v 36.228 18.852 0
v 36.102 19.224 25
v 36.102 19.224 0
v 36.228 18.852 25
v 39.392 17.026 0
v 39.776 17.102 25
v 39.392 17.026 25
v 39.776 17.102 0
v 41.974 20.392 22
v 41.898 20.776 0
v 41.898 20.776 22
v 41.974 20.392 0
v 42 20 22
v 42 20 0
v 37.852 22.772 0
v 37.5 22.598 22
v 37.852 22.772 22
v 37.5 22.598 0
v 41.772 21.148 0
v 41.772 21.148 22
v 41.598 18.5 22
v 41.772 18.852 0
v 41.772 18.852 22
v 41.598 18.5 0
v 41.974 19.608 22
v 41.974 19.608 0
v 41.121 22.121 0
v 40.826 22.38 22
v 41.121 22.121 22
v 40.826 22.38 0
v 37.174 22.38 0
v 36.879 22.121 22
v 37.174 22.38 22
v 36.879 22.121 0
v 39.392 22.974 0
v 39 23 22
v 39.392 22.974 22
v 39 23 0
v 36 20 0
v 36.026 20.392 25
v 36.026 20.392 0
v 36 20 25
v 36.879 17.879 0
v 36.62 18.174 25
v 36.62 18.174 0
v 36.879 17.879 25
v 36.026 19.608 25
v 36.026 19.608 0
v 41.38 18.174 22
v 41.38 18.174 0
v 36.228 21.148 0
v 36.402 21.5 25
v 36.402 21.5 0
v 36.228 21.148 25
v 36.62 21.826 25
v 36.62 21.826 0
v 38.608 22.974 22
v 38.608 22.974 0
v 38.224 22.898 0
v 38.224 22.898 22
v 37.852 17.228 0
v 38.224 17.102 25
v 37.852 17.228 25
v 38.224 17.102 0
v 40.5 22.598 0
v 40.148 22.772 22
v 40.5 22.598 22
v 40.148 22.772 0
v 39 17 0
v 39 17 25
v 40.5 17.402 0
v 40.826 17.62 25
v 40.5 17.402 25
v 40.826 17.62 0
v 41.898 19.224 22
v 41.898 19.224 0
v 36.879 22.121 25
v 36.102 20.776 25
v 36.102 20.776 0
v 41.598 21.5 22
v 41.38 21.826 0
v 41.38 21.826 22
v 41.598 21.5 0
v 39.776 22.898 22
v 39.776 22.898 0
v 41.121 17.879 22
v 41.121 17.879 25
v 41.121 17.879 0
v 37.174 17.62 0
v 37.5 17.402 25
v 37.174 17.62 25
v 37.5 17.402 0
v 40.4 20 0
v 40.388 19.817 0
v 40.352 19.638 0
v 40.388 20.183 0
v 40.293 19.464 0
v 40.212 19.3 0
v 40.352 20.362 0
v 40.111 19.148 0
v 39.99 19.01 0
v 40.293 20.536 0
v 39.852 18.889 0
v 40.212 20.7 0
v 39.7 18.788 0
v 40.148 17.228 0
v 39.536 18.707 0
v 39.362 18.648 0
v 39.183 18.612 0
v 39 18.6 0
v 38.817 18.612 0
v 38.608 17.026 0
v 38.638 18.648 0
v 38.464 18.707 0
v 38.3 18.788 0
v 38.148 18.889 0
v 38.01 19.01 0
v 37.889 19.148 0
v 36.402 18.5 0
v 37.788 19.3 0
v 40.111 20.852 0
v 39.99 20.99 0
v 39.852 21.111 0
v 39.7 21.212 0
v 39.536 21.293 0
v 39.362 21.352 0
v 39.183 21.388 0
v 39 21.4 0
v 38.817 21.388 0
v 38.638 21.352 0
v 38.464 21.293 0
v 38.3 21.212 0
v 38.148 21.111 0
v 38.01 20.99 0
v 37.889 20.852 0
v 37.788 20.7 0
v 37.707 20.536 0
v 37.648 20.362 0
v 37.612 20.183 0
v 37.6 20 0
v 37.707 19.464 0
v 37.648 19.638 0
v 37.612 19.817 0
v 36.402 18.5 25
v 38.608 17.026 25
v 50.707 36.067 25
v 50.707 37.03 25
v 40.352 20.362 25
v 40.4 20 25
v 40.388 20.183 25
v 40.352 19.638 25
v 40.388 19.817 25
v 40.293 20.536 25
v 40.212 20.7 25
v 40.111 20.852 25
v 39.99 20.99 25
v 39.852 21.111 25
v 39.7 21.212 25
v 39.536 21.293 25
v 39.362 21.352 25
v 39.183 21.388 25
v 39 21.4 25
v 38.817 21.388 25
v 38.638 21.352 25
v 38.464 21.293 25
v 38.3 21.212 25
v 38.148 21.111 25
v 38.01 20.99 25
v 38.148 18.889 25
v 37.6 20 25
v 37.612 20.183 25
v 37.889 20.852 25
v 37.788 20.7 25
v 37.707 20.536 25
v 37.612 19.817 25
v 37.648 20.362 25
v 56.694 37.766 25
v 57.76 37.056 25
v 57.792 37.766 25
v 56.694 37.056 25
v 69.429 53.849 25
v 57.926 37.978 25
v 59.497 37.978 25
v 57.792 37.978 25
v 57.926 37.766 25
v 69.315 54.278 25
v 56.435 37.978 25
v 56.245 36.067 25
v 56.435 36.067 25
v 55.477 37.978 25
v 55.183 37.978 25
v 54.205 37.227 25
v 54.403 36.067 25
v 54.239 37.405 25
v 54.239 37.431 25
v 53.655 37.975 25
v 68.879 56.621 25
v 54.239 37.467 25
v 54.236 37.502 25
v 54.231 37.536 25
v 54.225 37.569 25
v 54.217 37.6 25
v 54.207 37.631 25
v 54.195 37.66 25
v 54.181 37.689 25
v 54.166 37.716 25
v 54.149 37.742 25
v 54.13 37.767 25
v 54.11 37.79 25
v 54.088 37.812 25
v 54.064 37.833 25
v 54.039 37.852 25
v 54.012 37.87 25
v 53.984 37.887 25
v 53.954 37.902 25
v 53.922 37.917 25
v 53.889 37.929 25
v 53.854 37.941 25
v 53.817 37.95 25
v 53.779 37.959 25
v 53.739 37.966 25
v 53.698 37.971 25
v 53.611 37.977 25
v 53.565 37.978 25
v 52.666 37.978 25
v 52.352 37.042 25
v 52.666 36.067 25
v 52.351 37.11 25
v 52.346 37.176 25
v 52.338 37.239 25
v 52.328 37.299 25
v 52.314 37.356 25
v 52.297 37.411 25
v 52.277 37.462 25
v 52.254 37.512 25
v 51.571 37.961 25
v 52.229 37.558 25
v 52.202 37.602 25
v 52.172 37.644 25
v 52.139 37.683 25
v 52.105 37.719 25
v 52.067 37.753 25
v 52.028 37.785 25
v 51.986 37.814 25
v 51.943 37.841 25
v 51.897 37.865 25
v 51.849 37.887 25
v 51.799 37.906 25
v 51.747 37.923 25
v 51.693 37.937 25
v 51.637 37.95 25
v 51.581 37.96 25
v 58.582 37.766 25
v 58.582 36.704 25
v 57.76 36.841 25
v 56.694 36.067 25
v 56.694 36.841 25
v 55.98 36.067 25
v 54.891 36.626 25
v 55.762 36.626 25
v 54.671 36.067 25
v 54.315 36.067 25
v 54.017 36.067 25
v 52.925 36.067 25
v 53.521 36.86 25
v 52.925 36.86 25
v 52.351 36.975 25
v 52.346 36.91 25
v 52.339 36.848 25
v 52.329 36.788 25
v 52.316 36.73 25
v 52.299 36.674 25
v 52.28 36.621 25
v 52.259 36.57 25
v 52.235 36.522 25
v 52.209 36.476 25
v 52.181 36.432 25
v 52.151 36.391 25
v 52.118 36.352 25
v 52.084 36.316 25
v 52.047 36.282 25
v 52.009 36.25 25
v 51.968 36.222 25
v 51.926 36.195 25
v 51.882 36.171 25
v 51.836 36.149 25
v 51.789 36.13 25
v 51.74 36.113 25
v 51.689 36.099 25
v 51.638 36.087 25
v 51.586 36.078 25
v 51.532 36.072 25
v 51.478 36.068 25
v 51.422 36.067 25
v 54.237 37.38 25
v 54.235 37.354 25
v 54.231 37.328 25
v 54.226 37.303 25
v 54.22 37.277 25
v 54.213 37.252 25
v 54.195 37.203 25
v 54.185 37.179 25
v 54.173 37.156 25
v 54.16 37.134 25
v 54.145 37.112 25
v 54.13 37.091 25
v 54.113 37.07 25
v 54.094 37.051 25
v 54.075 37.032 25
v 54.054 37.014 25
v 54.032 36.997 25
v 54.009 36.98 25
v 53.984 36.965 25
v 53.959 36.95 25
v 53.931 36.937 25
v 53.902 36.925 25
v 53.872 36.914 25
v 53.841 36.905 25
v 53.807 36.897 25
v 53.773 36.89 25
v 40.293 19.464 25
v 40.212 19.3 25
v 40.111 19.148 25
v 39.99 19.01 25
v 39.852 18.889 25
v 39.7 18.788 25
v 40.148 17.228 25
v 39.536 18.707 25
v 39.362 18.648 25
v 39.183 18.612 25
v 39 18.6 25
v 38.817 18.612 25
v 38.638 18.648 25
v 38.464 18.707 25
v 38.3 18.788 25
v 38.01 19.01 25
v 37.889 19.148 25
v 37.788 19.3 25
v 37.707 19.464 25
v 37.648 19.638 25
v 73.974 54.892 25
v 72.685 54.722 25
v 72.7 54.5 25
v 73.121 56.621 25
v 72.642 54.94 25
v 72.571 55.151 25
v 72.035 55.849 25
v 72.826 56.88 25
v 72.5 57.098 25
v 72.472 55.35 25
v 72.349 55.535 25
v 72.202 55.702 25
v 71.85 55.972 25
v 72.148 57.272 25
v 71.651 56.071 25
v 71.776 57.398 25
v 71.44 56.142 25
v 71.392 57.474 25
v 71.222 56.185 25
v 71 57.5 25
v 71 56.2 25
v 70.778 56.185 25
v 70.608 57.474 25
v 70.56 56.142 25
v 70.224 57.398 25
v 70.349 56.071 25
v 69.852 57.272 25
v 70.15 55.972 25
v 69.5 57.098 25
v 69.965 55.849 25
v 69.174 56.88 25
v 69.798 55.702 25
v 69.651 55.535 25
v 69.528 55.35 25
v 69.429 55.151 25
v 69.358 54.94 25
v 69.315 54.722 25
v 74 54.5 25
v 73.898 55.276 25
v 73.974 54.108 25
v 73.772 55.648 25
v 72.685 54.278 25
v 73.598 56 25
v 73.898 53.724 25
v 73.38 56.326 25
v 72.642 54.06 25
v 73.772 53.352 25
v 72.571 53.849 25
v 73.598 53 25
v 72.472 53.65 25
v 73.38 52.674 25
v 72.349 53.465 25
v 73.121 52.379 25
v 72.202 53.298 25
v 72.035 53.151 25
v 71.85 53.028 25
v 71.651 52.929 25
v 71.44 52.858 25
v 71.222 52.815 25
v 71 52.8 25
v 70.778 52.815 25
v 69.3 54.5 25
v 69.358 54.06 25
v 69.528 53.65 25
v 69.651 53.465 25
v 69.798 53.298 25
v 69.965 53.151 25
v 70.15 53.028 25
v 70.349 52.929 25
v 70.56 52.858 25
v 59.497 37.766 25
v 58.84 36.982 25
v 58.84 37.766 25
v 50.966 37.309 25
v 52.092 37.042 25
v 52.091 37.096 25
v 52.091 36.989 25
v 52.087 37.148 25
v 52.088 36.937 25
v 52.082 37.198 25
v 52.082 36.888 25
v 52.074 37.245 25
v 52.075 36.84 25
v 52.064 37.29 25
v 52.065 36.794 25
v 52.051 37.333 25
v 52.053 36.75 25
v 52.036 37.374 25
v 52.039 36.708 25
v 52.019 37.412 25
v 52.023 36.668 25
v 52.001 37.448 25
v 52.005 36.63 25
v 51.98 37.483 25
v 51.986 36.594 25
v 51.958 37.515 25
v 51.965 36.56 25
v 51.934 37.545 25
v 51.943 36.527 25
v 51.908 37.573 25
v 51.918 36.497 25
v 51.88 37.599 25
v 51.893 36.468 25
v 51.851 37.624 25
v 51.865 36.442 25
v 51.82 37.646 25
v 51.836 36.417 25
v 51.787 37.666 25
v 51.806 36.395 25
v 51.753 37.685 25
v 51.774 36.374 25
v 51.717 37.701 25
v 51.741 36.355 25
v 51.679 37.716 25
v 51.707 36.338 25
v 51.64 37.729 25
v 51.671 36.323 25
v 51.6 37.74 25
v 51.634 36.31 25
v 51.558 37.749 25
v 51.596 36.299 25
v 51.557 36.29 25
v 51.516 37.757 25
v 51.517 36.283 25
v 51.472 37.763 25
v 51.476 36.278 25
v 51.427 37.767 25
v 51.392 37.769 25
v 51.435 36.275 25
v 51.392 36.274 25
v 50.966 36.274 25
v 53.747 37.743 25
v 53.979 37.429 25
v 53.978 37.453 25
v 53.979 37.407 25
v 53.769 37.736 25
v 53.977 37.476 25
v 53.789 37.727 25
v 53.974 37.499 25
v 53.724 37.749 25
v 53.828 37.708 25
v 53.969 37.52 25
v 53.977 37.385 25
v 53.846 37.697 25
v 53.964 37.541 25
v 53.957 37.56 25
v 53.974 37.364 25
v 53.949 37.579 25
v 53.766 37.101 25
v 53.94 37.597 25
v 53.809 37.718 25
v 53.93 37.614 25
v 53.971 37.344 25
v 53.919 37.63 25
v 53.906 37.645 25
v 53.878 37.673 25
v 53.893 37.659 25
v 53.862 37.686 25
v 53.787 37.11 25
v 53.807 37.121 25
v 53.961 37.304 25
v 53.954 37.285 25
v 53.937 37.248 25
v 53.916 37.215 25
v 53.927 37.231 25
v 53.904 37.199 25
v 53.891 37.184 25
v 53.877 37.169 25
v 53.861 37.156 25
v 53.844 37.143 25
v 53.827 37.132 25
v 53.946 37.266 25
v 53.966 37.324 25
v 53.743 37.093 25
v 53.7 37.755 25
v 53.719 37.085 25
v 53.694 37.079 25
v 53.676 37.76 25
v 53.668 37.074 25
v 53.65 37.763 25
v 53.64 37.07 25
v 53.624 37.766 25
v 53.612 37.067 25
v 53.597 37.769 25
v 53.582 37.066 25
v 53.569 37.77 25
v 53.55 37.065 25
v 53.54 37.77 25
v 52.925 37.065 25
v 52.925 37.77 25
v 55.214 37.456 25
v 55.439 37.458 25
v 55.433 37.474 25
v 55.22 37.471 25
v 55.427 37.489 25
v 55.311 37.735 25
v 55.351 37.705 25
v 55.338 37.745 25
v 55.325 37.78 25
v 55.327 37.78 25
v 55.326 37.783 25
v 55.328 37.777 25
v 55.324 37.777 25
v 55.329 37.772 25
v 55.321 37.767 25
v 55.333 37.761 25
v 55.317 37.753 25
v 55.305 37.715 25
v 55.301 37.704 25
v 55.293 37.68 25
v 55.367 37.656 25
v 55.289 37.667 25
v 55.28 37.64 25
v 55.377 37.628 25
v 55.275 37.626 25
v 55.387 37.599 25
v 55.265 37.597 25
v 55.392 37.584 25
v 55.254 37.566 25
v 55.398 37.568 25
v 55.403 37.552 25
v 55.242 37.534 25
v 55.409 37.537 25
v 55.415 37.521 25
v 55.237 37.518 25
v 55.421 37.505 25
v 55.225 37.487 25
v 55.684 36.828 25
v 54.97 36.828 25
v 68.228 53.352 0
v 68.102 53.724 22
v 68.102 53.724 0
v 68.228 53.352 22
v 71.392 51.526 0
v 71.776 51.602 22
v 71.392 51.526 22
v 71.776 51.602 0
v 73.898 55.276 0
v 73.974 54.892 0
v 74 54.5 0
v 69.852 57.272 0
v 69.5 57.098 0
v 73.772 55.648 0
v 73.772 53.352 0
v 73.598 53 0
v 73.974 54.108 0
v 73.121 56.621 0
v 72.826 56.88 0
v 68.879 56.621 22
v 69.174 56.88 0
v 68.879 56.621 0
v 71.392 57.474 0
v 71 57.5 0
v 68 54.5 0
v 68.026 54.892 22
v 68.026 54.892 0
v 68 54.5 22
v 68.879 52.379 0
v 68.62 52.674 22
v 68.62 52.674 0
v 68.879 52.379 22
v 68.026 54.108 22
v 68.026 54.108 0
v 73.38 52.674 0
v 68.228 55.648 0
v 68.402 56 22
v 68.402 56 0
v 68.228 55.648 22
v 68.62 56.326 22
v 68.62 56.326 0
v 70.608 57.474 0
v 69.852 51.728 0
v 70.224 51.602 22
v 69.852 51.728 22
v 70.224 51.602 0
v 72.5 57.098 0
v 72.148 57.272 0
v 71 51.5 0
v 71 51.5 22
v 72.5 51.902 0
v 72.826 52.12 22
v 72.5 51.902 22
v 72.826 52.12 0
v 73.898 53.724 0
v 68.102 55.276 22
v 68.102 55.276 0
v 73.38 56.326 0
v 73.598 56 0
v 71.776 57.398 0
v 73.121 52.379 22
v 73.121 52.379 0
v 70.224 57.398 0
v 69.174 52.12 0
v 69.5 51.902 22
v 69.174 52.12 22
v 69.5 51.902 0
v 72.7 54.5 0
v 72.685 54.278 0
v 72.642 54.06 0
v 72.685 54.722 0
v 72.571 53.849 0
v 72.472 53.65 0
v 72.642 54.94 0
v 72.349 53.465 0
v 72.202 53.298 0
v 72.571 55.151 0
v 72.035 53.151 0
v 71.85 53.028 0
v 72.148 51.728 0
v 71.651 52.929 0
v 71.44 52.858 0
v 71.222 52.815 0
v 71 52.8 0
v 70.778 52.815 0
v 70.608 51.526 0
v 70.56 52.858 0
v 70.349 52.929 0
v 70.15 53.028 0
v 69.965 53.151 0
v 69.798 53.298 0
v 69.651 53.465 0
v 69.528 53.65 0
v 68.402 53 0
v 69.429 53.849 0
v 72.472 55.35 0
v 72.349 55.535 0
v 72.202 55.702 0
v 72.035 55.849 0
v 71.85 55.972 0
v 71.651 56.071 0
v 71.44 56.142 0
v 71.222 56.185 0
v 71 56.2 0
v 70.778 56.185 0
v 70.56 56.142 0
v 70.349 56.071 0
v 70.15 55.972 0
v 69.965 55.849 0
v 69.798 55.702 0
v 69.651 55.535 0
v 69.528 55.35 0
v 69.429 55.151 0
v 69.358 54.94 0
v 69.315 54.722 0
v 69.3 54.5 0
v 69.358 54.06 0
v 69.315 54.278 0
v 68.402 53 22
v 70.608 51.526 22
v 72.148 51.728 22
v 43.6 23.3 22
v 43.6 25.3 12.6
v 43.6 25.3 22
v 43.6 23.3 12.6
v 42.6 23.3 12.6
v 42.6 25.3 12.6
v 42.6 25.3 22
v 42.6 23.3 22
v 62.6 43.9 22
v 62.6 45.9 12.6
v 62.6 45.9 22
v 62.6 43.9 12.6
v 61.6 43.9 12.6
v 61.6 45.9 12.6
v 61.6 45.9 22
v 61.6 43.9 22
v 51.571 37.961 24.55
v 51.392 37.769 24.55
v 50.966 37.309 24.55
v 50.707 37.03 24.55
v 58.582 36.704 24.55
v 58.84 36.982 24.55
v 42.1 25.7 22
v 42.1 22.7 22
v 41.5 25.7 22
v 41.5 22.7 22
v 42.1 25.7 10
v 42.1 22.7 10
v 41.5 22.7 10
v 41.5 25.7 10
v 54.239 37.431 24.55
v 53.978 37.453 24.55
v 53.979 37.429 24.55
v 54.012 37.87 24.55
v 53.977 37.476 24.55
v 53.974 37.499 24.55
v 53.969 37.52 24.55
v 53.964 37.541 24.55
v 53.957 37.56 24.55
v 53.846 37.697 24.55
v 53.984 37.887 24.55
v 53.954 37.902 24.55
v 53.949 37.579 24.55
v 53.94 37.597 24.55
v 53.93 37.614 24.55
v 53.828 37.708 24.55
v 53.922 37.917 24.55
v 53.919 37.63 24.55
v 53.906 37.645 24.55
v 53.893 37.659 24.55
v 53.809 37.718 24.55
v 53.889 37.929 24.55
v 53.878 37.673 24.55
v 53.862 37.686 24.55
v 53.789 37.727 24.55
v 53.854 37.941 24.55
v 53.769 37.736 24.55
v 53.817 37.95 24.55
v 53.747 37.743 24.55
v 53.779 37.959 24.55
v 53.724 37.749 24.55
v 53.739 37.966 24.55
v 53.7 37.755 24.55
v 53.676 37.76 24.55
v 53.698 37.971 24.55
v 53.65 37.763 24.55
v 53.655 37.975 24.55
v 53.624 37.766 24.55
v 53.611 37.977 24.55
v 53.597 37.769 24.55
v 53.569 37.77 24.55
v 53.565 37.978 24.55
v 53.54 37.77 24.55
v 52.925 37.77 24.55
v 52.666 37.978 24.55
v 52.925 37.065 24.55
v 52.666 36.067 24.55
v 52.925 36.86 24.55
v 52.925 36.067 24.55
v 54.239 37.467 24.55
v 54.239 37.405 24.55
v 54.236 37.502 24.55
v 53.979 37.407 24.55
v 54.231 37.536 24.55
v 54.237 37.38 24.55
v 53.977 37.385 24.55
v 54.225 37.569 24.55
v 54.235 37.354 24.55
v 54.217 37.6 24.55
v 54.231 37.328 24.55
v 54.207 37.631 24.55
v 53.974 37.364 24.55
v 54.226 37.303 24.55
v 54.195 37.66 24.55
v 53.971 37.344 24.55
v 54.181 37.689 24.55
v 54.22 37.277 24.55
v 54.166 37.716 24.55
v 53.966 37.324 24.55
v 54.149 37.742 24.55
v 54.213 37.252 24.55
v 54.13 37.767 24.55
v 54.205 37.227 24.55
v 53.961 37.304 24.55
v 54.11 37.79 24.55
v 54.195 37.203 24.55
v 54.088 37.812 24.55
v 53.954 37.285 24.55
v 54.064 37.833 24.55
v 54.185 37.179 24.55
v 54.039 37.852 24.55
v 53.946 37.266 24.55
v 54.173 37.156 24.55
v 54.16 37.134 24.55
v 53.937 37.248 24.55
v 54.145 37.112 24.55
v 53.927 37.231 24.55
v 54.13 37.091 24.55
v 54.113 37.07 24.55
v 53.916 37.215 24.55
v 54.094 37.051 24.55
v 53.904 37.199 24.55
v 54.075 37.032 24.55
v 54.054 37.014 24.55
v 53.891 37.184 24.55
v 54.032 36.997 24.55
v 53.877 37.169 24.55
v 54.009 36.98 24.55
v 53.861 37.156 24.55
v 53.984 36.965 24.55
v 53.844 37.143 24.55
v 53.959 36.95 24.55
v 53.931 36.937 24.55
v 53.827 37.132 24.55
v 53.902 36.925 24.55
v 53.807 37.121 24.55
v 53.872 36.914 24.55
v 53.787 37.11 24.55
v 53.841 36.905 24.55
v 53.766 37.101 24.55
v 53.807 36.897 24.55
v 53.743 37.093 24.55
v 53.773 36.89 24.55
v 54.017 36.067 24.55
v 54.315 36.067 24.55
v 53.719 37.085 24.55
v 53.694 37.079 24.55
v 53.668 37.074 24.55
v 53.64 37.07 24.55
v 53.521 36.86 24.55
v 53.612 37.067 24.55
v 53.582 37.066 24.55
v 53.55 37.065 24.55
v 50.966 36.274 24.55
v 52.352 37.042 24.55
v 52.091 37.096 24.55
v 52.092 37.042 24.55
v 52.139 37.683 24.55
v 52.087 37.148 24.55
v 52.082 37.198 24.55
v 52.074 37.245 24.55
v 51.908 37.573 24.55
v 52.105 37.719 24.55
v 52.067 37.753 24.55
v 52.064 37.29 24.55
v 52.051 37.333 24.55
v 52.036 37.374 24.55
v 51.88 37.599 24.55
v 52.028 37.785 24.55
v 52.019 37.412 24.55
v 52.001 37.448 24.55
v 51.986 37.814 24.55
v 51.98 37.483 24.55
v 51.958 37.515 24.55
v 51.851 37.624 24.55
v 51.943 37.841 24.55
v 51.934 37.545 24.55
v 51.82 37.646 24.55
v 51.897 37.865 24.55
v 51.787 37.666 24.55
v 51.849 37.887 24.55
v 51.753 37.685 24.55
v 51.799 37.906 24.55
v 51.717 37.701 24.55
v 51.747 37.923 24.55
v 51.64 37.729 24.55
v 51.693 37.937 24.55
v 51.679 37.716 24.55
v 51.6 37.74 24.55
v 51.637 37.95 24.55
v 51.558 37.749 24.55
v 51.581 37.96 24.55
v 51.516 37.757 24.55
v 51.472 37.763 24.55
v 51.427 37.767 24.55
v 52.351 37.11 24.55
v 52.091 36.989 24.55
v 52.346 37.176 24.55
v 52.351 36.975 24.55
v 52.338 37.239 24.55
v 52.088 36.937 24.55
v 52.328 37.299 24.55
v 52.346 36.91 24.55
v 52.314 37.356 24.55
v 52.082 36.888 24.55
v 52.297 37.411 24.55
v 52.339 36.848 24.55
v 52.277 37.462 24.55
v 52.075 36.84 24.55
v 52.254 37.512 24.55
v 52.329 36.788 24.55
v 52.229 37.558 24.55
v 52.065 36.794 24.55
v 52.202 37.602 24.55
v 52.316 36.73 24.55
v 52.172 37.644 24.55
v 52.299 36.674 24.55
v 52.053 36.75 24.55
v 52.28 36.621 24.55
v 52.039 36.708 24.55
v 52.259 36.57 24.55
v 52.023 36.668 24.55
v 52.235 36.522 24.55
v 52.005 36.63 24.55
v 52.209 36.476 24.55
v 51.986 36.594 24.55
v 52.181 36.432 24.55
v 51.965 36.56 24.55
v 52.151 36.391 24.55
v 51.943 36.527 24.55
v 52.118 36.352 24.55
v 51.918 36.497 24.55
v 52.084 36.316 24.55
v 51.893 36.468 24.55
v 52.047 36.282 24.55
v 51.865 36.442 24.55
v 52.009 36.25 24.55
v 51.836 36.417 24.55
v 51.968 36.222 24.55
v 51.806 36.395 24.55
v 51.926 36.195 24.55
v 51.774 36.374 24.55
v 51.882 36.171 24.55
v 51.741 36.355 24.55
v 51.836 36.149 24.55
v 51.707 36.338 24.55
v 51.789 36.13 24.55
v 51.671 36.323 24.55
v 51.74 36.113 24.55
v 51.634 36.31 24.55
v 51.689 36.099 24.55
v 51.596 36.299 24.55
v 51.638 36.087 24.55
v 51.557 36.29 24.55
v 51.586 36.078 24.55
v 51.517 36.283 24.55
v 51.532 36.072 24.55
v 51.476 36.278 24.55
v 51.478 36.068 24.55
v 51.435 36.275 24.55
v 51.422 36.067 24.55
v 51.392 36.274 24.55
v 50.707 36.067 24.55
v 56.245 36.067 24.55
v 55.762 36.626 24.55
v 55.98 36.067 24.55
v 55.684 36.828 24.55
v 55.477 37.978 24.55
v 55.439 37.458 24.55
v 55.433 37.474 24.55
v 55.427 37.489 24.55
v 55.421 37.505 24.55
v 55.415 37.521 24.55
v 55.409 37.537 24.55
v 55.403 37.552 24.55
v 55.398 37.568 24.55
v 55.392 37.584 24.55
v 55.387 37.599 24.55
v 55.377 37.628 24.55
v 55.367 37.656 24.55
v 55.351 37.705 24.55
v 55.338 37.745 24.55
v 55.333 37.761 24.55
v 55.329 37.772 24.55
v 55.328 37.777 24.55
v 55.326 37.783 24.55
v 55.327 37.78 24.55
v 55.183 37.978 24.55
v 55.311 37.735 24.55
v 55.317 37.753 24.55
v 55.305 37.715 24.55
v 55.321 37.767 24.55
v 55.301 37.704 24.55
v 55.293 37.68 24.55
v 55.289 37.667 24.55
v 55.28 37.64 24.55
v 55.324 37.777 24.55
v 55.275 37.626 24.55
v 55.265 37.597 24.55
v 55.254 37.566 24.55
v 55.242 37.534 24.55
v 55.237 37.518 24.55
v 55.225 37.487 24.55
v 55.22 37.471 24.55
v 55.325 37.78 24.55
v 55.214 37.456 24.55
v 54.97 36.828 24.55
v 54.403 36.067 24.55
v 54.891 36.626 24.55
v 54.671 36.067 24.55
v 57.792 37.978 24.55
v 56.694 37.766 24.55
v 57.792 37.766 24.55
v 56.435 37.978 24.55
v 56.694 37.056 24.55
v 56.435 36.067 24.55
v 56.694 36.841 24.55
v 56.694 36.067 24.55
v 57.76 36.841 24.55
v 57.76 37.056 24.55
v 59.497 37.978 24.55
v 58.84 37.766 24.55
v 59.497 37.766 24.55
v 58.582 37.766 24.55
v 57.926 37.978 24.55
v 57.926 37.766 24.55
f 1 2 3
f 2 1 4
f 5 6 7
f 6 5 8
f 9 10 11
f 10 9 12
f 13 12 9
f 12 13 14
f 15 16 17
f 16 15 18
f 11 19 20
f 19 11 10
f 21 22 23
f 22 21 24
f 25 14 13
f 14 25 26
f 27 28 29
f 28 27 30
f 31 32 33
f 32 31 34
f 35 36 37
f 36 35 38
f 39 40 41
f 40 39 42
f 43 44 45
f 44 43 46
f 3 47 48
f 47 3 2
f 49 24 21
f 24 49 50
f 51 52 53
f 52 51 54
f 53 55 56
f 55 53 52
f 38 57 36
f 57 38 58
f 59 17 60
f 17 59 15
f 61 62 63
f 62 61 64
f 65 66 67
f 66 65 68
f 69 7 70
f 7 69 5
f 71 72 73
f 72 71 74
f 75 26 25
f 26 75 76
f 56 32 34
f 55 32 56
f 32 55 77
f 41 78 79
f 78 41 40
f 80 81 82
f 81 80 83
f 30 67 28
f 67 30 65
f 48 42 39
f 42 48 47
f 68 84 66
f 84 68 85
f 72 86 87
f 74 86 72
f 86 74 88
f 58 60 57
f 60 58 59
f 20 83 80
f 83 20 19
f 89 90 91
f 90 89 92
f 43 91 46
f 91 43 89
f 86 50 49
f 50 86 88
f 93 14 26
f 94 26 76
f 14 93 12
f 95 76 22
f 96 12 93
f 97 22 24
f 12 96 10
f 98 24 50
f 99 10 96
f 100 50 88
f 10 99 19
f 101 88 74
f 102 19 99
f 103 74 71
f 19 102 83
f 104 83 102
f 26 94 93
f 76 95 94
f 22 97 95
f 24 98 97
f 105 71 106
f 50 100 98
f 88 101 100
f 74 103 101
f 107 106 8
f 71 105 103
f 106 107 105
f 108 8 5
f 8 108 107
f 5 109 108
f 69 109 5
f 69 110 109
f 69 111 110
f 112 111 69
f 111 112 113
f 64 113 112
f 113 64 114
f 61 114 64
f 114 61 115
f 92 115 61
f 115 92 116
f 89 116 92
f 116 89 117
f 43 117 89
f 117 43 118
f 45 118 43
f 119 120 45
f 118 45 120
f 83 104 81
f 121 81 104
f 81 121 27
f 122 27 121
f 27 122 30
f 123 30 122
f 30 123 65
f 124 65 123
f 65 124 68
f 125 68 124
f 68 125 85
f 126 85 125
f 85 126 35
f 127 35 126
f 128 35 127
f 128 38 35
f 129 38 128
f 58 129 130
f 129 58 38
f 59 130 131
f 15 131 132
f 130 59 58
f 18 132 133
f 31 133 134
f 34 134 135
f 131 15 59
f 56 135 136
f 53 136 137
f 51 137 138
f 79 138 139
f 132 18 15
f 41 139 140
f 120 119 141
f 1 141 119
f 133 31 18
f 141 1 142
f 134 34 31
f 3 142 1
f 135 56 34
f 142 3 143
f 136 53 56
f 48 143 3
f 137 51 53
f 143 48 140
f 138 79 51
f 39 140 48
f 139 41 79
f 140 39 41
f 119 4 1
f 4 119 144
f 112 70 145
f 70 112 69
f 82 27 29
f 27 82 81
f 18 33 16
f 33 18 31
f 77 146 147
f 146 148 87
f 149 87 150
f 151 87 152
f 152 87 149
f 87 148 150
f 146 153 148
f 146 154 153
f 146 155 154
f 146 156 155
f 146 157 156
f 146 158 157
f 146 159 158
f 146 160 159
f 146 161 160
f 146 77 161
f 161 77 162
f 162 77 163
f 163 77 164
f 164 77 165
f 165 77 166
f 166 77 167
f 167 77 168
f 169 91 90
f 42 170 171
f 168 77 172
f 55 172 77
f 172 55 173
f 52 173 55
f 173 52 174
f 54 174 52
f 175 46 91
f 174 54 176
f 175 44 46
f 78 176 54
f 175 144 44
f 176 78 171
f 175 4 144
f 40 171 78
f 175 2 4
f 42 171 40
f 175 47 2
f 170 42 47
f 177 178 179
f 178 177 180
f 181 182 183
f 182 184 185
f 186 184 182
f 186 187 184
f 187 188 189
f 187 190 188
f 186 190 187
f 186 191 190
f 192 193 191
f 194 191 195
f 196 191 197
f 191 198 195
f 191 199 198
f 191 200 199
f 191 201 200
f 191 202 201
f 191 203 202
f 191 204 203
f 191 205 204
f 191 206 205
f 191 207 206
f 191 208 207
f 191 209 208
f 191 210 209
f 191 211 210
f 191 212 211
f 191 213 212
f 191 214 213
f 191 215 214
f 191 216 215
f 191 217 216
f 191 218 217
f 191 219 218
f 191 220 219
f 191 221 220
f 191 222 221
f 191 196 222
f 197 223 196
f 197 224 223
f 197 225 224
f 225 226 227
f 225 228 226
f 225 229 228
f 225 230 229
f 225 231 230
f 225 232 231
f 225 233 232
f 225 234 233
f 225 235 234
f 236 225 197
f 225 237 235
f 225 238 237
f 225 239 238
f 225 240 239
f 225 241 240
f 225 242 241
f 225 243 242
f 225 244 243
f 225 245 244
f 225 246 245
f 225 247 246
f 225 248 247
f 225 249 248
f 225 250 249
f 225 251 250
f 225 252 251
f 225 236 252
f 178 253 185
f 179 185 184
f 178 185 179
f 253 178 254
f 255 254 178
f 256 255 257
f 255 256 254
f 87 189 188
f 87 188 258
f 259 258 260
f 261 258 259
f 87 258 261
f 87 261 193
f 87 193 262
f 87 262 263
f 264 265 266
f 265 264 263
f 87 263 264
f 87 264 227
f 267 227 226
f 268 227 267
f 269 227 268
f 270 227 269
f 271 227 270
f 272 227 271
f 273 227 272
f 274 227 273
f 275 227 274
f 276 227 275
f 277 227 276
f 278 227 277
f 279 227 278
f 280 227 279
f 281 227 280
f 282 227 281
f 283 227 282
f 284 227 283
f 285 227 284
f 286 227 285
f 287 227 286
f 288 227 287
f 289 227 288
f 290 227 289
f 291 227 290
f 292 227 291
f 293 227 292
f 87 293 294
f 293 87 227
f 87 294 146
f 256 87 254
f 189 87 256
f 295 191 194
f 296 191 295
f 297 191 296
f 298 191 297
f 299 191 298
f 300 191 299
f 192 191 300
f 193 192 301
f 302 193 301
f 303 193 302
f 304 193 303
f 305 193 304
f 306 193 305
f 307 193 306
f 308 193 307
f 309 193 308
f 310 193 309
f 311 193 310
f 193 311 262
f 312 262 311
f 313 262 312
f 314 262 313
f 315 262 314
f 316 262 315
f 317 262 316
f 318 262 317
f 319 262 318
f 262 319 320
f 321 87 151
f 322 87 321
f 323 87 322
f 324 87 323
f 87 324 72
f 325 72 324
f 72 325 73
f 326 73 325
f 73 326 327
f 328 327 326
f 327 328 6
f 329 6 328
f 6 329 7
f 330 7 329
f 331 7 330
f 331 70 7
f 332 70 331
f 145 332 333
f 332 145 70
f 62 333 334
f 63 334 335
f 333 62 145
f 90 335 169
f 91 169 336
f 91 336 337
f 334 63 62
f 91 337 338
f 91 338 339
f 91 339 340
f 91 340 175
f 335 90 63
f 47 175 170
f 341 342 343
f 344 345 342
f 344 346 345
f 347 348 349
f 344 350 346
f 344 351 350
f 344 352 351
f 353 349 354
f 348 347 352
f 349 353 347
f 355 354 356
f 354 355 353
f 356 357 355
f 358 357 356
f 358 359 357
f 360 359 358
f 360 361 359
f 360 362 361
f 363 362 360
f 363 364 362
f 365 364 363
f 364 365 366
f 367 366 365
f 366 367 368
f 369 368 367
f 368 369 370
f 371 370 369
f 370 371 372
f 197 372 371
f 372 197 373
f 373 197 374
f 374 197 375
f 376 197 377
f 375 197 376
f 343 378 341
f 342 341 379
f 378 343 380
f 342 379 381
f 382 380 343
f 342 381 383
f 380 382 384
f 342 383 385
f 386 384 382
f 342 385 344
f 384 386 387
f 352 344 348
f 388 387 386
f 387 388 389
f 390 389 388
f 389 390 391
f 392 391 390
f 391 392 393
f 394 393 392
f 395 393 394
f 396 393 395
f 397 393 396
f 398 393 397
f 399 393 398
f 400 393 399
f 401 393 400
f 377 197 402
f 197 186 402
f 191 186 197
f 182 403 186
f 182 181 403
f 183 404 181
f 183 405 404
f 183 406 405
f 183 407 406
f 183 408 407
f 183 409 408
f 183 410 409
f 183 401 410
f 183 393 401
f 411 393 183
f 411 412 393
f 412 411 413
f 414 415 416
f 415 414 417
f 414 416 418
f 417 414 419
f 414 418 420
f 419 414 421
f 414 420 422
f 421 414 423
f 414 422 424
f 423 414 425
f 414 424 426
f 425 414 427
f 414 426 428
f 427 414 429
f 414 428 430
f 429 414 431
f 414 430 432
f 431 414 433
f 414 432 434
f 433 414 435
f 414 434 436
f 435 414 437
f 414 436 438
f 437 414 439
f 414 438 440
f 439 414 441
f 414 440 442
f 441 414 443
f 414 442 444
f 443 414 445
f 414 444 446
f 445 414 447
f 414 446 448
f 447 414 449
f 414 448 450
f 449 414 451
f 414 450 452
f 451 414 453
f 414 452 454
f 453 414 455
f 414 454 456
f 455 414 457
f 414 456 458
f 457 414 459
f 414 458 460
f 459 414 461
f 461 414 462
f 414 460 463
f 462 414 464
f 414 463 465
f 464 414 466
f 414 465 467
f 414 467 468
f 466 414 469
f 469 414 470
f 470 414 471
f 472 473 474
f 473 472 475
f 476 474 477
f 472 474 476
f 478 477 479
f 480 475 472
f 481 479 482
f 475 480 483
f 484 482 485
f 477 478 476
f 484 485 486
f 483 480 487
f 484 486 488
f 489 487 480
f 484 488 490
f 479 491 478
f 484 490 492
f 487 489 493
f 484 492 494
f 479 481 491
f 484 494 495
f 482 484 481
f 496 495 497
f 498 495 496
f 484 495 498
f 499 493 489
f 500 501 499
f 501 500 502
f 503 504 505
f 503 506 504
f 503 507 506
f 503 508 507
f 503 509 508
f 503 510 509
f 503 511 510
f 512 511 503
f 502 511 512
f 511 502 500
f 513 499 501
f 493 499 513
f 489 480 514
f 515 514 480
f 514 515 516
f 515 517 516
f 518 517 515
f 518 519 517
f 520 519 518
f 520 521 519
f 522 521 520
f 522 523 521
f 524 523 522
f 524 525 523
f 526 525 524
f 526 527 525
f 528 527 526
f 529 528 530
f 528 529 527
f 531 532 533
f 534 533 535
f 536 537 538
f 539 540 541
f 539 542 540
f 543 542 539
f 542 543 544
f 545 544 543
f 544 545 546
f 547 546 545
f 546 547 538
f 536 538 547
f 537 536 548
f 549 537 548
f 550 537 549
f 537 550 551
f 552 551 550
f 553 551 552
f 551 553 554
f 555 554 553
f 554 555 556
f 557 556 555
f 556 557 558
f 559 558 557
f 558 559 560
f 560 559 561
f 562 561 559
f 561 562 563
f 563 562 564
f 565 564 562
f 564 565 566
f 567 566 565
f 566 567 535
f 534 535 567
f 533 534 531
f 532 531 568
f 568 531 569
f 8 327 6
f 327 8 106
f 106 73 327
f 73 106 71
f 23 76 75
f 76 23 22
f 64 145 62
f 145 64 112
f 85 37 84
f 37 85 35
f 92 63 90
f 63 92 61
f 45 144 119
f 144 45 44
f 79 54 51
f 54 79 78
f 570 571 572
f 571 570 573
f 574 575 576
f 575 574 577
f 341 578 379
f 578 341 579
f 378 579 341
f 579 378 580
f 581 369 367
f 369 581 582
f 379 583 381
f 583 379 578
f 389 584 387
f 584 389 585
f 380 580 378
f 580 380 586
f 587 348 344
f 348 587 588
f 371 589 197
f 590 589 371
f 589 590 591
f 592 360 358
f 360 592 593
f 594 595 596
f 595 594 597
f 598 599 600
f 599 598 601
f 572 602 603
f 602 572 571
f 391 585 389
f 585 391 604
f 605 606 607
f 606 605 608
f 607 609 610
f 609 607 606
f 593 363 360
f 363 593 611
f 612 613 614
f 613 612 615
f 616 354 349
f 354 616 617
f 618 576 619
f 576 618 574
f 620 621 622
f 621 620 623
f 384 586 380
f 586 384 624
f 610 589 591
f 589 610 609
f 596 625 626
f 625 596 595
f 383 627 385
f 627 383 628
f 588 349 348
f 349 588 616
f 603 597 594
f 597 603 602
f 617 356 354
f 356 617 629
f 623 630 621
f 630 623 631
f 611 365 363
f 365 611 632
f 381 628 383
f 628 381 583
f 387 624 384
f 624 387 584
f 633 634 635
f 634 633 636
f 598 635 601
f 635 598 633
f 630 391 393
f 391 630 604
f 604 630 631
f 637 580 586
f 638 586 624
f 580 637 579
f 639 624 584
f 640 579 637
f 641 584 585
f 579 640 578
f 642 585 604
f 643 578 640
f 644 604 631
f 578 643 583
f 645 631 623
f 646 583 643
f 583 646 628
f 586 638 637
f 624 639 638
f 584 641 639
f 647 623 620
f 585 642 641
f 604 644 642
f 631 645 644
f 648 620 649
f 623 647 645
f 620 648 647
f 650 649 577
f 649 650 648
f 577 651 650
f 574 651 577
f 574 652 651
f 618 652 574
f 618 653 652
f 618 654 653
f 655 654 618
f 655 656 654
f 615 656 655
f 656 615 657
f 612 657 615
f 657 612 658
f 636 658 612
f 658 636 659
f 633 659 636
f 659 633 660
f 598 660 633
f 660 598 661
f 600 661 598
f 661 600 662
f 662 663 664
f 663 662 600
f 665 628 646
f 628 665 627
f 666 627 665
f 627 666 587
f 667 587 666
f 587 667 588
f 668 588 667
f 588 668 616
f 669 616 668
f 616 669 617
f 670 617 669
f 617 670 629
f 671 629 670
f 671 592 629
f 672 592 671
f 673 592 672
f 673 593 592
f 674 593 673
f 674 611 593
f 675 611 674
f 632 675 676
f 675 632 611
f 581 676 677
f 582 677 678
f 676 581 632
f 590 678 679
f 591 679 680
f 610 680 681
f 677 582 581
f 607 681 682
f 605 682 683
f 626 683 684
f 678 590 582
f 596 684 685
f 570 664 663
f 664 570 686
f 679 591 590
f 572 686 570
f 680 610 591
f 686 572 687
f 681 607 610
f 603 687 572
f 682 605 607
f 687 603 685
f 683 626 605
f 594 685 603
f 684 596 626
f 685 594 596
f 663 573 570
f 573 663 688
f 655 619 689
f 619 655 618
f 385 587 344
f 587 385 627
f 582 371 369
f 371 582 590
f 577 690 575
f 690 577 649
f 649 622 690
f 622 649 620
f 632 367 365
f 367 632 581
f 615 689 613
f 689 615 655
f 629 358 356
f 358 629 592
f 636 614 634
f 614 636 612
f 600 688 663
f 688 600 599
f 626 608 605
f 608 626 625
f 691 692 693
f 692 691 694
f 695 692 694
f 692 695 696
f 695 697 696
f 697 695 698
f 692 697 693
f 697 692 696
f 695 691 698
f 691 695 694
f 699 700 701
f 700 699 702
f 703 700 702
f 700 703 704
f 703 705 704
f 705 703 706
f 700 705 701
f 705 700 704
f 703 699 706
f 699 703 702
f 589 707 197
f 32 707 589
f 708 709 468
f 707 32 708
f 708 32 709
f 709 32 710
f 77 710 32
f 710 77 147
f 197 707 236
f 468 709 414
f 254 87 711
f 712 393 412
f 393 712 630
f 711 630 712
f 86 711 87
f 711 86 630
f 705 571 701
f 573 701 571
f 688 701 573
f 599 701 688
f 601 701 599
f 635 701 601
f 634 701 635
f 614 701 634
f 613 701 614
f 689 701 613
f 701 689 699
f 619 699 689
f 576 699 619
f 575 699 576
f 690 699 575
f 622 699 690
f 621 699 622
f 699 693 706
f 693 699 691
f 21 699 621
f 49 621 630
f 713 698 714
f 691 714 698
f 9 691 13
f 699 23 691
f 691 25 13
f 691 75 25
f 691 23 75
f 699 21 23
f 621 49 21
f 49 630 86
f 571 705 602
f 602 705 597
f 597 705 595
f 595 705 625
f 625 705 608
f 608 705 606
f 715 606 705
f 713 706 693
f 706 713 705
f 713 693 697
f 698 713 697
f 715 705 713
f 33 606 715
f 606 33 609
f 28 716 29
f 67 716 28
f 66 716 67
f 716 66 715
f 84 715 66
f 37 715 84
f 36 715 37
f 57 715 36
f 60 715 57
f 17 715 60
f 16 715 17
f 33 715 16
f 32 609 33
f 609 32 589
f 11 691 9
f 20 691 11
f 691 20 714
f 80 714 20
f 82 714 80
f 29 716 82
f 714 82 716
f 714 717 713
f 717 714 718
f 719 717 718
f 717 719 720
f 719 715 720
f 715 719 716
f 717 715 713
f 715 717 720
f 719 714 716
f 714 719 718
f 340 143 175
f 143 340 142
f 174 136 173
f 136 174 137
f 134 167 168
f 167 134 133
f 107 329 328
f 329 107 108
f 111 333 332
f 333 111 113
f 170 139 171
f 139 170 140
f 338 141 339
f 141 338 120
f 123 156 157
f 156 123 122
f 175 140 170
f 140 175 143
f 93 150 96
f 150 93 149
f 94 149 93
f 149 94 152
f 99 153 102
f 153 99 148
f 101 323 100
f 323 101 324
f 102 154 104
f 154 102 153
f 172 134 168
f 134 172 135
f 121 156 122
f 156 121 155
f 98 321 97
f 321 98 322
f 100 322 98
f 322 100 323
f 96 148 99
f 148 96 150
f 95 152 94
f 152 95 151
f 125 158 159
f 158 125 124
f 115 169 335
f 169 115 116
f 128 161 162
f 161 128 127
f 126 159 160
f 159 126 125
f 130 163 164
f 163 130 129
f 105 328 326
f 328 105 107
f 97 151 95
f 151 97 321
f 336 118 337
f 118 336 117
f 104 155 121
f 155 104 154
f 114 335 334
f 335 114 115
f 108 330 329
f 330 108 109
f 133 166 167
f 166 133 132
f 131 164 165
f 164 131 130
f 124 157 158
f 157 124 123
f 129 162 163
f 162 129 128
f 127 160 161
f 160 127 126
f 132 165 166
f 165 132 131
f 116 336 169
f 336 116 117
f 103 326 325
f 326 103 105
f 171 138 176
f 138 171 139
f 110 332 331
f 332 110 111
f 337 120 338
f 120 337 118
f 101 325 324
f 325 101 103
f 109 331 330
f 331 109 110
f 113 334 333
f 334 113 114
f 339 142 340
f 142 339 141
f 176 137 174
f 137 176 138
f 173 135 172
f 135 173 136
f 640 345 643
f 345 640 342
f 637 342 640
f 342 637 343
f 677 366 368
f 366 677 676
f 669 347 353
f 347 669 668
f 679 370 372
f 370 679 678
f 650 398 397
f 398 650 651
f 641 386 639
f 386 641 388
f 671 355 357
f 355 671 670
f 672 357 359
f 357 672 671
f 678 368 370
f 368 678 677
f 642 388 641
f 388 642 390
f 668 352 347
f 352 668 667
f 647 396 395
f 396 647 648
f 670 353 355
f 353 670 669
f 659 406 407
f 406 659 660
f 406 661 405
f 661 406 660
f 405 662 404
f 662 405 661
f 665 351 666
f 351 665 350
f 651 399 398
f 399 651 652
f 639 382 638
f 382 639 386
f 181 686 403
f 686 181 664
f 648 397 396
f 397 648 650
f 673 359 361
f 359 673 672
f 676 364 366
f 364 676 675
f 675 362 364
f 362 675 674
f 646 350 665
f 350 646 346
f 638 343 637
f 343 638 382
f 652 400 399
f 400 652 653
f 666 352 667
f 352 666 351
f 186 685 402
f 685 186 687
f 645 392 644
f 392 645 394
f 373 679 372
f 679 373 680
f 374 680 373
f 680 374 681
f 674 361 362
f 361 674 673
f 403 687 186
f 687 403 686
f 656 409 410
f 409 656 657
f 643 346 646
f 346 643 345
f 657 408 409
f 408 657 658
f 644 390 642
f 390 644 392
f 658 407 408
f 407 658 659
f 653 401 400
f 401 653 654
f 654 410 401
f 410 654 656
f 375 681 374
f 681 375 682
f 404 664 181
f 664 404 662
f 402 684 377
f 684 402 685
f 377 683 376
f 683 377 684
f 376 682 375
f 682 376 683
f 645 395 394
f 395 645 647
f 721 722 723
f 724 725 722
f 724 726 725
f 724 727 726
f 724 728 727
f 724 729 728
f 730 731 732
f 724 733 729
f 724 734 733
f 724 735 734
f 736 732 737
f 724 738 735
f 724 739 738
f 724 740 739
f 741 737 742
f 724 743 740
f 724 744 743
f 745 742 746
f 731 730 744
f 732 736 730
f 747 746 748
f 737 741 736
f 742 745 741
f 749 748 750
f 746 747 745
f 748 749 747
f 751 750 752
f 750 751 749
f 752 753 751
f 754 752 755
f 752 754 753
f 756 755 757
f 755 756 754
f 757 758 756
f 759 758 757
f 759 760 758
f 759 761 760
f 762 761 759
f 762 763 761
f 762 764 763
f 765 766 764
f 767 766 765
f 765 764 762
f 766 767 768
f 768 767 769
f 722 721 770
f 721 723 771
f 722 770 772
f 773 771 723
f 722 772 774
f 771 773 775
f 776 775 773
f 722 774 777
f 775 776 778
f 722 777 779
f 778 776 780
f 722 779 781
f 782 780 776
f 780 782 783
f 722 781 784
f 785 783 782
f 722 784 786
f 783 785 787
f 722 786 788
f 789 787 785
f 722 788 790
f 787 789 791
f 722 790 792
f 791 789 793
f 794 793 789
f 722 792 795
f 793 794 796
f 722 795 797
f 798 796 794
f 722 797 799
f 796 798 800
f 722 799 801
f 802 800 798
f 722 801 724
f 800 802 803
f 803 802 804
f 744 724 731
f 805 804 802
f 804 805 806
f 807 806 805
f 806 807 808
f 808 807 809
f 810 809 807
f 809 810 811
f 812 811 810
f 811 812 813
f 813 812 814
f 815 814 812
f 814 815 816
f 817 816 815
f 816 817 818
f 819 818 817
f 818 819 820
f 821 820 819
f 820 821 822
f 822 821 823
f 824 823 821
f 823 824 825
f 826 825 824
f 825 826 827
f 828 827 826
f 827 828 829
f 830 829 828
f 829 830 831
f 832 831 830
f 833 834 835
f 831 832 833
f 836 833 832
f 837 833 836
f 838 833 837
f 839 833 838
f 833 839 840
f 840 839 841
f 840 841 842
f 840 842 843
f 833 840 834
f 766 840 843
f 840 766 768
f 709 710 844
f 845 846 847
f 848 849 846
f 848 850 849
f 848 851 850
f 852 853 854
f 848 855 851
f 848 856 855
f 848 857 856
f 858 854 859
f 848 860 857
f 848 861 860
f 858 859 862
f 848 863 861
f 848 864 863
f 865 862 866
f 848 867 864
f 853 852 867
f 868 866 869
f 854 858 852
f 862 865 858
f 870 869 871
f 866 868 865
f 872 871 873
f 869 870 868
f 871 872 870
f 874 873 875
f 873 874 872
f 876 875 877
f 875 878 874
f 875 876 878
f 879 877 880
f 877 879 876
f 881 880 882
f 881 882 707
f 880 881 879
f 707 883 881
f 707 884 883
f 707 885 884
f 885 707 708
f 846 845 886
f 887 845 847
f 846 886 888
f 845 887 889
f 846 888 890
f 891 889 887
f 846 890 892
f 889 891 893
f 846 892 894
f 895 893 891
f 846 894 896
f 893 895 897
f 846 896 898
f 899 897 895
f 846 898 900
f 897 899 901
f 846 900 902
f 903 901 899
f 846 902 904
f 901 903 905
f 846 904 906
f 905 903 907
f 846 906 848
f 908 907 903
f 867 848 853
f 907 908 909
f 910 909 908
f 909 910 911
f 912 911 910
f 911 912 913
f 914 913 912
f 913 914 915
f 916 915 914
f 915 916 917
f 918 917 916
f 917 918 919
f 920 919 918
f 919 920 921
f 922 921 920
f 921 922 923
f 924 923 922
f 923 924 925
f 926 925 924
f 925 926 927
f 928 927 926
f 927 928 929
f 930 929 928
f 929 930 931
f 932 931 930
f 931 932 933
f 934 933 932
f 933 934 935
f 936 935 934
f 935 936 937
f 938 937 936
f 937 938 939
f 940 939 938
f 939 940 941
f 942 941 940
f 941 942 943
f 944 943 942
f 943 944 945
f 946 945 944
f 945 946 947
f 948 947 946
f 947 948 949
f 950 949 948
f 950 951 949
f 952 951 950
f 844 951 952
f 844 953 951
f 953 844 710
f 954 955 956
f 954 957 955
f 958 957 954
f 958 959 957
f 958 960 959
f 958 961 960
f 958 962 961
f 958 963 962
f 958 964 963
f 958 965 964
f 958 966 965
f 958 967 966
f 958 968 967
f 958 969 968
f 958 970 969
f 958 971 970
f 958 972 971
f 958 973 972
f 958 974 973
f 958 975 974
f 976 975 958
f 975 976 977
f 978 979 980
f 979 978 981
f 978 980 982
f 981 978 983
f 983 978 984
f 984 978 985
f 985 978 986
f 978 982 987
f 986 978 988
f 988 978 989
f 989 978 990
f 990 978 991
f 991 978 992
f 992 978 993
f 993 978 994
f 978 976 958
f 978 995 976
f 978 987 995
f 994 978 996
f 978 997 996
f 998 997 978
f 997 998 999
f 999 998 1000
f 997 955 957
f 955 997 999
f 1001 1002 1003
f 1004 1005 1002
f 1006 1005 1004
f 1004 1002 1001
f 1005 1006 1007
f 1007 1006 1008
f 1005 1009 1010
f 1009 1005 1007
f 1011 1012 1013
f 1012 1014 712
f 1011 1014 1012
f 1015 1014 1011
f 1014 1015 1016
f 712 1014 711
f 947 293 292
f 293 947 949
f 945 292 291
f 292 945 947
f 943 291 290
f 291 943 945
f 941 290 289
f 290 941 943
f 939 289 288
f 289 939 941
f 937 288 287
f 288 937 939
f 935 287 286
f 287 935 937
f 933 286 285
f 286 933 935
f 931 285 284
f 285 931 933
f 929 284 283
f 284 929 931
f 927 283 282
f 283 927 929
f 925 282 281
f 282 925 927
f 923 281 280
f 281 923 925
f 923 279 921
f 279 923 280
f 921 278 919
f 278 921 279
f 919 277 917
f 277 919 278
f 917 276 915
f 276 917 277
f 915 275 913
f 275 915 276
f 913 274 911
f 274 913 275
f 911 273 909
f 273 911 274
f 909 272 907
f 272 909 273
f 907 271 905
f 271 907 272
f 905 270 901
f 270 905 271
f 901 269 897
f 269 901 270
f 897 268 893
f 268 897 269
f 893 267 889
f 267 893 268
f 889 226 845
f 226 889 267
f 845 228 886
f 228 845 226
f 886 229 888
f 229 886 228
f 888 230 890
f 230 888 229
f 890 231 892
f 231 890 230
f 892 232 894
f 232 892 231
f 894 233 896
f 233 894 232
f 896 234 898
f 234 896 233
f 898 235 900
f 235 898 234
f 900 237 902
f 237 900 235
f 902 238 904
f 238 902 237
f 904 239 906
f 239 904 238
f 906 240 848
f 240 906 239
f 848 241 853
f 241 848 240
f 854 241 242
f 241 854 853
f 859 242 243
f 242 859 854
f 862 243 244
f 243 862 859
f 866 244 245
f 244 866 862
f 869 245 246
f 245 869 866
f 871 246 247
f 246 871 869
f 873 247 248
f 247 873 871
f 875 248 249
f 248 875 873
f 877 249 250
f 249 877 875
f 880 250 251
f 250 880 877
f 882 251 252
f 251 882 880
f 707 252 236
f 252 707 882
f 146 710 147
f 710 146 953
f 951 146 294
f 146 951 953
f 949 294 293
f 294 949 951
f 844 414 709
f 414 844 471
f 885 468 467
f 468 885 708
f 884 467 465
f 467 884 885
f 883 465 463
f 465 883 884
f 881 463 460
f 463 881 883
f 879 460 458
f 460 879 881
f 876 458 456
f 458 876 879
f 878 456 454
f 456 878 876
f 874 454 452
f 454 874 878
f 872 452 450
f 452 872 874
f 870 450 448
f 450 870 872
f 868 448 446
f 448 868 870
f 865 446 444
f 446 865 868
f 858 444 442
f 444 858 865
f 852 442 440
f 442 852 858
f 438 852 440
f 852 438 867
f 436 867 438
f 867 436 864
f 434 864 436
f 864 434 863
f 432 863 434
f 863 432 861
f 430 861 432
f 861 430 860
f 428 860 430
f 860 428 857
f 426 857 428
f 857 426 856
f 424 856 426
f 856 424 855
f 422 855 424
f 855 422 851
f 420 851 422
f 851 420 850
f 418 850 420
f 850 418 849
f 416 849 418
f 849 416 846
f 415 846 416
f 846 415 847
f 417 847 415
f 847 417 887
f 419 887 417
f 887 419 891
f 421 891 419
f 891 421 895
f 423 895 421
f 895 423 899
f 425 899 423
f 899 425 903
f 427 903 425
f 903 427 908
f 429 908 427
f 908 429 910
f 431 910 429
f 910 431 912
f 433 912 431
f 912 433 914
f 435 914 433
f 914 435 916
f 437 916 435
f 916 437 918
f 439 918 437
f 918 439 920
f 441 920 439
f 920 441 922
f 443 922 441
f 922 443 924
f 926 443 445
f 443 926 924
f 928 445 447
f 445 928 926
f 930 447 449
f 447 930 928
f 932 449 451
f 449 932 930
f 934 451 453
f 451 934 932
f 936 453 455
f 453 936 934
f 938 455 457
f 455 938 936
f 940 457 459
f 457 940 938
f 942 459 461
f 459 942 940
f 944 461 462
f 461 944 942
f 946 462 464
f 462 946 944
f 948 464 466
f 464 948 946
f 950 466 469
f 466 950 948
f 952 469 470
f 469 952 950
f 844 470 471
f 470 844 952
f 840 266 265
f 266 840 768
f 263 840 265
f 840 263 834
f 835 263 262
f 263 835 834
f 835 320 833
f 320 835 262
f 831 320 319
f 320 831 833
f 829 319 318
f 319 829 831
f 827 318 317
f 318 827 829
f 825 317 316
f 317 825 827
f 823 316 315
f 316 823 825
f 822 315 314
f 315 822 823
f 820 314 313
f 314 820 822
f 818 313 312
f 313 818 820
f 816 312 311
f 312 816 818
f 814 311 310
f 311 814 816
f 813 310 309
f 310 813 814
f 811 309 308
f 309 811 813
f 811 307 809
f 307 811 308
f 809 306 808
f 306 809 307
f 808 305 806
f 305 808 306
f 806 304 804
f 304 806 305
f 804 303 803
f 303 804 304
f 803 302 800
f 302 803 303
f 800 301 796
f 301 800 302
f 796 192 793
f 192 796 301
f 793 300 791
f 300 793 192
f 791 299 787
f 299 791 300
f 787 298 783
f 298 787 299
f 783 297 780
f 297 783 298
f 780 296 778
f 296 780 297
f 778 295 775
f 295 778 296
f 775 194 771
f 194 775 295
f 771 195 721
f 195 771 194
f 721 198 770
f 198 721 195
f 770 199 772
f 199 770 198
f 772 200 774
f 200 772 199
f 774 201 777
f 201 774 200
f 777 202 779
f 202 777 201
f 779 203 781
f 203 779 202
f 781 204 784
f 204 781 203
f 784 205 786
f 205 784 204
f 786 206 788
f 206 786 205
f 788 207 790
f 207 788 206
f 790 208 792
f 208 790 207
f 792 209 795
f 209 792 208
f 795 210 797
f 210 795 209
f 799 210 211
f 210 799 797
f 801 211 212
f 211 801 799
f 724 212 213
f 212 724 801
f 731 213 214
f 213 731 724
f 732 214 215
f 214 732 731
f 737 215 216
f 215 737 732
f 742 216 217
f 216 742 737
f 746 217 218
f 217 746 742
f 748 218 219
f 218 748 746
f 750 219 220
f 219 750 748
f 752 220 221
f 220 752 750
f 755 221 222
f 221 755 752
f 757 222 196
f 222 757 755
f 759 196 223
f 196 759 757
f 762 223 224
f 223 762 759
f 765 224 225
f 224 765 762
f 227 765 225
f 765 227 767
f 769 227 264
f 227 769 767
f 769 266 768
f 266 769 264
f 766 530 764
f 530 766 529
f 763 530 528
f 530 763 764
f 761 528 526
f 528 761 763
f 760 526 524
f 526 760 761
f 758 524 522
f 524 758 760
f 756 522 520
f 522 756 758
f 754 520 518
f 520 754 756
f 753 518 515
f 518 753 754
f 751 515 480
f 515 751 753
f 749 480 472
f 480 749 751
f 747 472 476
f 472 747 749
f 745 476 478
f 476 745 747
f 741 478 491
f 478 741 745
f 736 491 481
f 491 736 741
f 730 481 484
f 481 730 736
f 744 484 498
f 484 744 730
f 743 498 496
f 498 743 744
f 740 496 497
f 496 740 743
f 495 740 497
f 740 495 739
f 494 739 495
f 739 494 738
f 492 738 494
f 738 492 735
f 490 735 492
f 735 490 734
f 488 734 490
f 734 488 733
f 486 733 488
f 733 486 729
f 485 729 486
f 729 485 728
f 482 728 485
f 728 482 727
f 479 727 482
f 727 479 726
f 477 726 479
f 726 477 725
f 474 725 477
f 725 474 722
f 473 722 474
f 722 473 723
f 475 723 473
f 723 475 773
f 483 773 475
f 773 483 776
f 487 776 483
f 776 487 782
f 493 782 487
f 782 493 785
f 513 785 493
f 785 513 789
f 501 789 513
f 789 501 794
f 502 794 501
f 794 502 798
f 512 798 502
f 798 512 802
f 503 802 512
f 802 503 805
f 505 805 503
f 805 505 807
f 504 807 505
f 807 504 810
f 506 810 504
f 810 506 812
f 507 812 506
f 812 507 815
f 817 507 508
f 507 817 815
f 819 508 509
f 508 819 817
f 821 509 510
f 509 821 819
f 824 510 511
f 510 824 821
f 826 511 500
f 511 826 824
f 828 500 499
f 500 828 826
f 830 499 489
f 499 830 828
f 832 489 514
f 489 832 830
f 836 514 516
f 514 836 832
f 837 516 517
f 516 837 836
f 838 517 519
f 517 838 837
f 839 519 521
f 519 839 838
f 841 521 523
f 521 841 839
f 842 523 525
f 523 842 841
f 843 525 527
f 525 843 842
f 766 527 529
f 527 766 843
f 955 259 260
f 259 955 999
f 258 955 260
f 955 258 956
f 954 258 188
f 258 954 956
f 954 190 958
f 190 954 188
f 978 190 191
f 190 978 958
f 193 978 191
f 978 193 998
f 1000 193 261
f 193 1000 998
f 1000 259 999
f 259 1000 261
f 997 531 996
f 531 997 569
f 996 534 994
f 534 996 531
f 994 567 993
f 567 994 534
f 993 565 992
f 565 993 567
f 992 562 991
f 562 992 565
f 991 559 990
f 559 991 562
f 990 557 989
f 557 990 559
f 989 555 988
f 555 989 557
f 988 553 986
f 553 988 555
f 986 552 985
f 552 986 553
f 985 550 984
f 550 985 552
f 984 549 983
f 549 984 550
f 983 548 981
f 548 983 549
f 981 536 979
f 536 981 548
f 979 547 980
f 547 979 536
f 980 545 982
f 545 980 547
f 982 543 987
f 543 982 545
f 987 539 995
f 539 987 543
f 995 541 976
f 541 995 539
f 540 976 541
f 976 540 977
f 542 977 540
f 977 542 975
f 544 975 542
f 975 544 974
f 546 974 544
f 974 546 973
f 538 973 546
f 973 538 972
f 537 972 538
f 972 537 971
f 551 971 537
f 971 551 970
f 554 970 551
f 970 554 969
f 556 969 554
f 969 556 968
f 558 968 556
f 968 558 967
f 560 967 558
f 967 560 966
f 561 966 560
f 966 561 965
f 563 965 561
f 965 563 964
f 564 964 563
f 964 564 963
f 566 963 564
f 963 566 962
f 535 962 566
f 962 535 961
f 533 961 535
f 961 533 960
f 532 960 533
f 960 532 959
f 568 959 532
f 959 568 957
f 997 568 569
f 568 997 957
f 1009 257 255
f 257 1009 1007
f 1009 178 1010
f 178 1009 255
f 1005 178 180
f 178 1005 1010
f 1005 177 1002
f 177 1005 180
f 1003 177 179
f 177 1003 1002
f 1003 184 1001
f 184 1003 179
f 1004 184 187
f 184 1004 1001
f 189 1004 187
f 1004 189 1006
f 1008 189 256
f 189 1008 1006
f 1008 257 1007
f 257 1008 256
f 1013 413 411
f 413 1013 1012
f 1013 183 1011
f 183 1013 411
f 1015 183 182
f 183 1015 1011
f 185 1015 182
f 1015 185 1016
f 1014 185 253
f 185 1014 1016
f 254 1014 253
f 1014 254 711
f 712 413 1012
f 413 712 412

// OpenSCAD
// MSM TR2 shield V1.1 — REVIEW ONLY, NO FABRICATION RELEASE.
// Coordinates and contact surfaces are nominal hypotheses, not measured C05/MKI geometry.
// Caller selects part="mki", "click", "flat_clamp", "round_clamp", "user_plunger".
// Modules remain replaceable after removing two insulating through-bolts.
part="mki";
review_only=true;
assert(review_only,"Fabrication blocked: mechanical fit, key features and materials need review");
$fn=48;
module_bottom=11; pcb_t=1.6; contact_z=module_bottom+pcb_t;
roof_z=22; roof_t=3; foot_r=3;
mki_anchors=[[39,20],[71,54.5]];
click_anchors=[[91,75],[91,108]];
// MKI body below is the explicitly provisional envelope from V1, not a ST dimension.
mki_body=[42.46,21.46,62.78,54.48];
module bore(p,d,h=30){translate([p[0],p[1],-1])cylinder(d=d,h=h);}
module beam(points,z,t,r=3){hull()for(p=points)translate([p[0],p[1],z])cylinder(r=r,h=t);}
module support(p){translate([p[0],p[1],0])cylinder(r=foot_r,h=roof_z+roof_t);}
module mark(p,label){translate([p[0],p[1],roof_z+roof_t-.45])linear_extrude(1)text(label,size=2,halign="center",valign="center");}
module mki(){
 difference(){
  union(){
   for(p=mki_anchors)support(p);
   beam(mki_anchors,roof_z,roof_t);
   // Broad roof is above assumed component envelope; edge pads alone set the nominal contact height.
   for(p=[[43.1,24.3],[62.1,44.9]])translate([p[0]-.5,p[1]-1,contact_z])cube([1,2,roof_z-contact_z+.1]);
   // Provisional keyed rim: final mating connector protrusion/notch remains UNMEASURED.
   translate([41.5,22.7,10])cube([.6,3,roof_z-10]);
  }
  bore(mki_anchors[0],2.8);bore(mki_anchors[1],3.4);
  mark([55,37],"DRAFT");
 }
}
module click(){
 difference(){
  union(){
   for(p=click_anchors)support(p);
   beam(click_anchors,roof_z,roof_t);
   beam([[83,91.43],[91,91.43]],roof_z,roof_t,2);
   // Key fence accepts v101 long isolated end to +X; reversed body conflicts with fence.
   translate([82.5,89.43,10])cube([.4,4,roof_z-10]);
   translate([83.6,90.43,contact_z])cube([1,2,roof_z-contact_z+.1]);
  }
  bore(click_anchors[0],2.8);bore(click_anchors[1],3.4);
  mark([91,92],"FIT?");
 }
}
// Case-mounted saddles, never mounted on a module or electronic connector.
// Dimensions below are design proposals. Actual jacket diameter and ribbon thickness are unknown.
module saddle(flat=false){
 difference(){
  translate([-12,-4,0])cube([24,8,8]);
  for(x=[-9,9])translate([x,0,-1])cylinder(d=3.4,h=10);
  if(flat)translate([-4.2,-5,-1])cube([8.4,10,2]);
  else translate([0,-5,1])rotate([-90,0,0])cylinder(d=5,h=10);
  if(!flat)translate([-2.5,-5,-1])cube([5,10,2]);
 }
}
module user_plunger(){
 // Generic captive plunger, cut length only after C05 height/stroke is known.
 cylinder(d=8,h=2);translate([0,0,2])cylinder(d=3,h=12);
}
if(part=="mki")mki();
else if(part=="click")click();
else if(part=="flat_clamp")saddle(true);
else if(part=="round_clamp")saddle(false);
else if(part=="user_plunger")user_plunger();
else assert(false,"Unknown part");
